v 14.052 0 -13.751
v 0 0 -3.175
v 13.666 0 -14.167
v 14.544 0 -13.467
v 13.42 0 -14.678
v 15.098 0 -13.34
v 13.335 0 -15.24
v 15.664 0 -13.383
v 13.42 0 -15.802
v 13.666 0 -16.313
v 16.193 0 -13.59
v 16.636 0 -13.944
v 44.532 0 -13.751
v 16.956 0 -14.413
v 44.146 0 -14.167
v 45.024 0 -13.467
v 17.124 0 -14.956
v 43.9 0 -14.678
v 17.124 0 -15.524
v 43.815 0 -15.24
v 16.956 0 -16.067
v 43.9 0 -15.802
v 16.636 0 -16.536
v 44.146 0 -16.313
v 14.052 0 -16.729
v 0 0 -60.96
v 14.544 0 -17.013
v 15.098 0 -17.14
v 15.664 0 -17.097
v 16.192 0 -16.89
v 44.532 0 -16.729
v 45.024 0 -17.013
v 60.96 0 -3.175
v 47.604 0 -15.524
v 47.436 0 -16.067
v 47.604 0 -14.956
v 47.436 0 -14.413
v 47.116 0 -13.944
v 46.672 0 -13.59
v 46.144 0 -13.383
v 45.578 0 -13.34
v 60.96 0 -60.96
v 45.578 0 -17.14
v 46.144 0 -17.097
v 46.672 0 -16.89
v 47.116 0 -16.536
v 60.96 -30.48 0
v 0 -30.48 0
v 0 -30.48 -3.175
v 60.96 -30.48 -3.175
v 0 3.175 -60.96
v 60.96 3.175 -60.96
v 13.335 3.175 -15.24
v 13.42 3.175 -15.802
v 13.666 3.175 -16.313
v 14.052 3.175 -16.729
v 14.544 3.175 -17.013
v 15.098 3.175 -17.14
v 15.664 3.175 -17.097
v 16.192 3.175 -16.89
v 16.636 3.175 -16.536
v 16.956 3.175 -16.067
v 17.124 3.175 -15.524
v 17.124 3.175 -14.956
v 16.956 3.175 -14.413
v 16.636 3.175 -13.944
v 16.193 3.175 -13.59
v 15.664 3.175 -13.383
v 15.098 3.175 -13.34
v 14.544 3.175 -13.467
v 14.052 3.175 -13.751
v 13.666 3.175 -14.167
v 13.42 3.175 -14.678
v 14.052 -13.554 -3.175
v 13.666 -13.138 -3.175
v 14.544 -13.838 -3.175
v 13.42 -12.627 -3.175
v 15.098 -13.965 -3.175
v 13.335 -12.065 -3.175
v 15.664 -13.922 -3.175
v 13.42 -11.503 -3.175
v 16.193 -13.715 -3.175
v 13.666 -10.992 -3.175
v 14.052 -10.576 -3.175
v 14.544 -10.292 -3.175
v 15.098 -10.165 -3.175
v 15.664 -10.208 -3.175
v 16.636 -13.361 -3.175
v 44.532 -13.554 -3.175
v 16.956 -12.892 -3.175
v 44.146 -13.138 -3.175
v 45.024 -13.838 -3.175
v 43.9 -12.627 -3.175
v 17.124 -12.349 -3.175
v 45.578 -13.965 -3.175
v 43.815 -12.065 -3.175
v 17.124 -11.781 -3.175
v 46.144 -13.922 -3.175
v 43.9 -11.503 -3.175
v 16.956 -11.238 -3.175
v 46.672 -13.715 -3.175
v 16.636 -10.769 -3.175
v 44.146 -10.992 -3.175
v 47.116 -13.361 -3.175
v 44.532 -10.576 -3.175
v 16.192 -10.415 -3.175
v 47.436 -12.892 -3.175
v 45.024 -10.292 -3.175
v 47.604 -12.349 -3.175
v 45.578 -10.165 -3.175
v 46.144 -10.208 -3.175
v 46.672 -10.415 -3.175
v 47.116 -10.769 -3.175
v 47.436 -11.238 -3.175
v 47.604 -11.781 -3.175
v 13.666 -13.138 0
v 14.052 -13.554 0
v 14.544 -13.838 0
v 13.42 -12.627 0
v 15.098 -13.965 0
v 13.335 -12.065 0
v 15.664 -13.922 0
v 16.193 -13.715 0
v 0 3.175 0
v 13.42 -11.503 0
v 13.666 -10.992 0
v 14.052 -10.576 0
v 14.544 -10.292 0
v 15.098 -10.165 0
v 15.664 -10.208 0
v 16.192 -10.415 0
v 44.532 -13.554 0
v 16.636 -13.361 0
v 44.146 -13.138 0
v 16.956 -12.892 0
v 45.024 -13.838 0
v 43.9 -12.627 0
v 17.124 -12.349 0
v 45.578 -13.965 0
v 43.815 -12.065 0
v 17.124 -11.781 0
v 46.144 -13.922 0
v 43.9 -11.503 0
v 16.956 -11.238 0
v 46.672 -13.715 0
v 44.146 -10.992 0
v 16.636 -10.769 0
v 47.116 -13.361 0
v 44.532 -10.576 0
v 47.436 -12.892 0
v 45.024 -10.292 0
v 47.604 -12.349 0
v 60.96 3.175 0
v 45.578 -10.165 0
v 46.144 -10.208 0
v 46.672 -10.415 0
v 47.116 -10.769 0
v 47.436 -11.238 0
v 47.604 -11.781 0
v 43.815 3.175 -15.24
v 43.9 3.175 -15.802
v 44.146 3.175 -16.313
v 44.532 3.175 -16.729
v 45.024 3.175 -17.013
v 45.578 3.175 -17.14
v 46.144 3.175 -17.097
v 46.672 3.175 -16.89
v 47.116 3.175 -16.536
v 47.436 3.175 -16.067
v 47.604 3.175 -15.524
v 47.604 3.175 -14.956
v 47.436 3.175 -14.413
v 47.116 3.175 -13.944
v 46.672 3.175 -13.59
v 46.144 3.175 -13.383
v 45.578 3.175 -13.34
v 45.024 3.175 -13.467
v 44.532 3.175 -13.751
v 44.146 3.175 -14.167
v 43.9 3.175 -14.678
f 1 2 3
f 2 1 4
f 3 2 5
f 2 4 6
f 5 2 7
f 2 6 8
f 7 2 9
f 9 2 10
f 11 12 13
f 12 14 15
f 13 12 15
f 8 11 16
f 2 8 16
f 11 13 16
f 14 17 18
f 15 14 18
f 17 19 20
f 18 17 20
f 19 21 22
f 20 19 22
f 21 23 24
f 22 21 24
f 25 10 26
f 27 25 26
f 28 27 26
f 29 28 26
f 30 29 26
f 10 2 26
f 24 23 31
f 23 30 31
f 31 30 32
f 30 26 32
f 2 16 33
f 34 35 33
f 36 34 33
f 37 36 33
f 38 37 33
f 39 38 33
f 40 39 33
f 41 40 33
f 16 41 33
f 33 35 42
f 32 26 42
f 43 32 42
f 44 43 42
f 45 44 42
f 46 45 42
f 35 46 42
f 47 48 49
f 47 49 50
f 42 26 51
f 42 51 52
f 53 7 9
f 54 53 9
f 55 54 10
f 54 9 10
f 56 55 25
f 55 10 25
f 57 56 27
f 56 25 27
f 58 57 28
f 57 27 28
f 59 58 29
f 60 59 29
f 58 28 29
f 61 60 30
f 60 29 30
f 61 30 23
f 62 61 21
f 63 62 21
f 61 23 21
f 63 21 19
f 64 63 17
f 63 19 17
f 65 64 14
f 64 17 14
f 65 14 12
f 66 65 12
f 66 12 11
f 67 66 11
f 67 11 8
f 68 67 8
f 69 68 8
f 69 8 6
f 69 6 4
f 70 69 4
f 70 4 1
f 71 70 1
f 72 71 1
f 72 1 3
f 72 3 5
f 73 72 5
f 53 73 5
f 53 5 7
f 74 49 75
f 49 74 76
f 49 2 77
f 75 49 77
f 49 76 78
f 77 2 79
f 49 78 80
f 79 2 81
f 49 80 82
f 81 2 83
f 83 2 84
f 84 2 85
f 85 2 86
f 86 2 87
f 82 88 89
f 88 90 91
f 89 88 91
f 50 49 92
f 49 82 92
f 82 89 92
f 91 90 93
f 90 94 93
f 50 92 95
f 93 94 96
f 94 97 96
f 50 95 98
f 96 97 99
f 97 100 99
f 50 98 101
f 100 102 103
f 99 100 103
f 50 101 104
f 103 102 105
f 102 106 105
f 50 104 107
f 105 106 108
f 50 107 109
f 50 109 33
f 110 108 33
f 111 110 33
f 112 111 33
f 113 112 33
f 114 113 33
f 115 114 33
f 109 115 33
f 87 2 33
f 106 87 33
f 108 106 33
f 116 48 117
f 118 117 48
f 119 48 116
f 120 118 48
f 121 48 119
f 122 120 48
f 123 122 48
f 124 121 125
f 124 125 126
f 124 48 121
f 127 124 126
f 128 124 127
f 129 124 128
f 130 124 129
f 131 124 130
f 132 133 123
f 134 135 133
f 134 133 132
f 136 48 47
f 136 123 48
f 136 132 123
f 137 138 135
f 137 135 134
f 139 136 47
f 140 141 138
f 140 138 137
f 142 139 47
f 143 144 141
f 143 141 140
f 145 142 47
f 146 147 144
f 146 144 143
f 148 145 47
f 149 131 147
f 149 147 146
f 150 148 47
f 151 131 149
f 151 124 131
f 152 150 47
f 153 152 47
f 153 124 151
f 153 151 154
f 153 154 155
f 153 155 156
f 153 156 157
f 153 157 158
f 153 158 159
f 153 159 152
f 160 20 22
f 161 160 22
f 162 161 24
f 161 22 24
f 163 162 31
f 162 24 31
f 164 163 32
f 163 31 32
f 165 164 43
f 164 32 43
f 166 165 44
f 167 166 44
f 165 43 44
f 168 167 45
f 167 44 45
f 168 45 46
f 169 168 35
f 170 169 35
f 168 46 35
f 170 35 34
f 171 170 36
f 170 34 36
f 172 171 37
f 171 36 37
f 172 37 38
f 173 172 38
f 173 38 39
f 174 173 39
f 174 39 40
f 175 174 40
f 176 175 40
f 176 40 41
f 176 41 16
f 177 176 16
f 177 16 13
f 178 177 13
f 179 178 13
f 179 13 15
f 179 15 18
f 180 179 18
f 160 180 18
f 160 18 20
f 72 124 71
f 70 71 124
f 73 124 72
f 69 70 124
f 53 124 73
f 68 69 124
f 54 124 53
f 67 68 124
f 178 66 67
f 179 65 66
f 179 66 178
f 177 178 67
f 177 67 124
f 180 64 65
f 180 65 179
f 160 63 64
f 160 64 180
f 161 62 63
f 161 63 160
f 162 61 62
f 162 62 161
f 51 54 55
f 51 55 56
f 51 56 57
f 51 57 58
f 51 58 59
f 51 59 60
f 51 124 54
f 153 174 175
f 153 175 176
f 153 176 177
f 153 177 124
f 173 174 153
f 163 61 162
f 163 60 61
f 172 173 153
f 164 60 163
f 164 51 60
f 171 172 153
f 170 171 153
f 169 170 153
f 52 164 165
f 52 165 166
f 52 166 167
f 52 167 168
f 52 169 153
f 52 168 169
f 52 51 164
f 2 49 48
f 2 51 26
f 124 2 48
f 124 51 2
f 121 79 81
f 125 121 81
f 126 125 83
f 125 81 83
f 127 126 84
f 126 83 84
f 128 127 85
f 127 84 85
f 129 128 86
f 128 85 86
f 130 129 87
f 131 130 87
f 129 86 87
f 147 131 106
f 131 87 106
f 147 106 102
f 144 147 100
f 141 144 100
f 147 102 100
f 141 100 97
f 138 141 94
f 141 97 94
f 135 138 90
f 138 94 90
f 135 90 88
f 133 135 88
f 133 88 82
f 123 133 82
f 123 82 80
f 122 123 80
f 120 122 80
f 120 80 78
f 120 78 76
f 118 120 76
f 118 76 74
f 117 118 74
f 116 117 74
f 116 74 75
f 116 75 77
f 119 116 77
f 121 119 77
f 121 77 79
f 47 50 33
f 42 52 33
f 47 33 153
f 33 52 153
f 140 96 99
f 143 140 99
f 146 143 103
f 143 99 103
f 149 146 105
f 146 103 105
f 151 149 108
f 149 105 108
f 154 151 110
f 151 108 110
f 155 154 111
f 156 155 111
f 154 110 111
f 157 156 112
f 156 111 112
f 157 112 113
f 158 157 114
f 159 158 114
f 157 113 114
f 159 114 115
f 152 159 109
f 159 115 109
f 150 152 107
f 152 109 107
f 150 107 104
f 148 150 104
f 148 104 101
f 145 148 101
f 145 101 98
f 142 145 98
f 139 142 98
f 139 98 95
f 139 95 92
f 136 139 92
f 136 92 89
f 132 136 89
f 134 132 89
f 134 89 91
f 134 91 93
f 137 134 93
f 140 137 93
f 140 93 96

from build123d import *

# Parameters (mm, degrees)
SKETCH3_W                 = 60.96
SKETCH3_H                 = 60.96
BOSS_EXTRUDE1_DEPTH       = 3.175
F_6_0_15_DIAMETER_HOLE1_D = 3.81
SKETCH6_W                 = 60.96
SKETCH6_H                 = 3.175
BOSS_EXTRUDE3_DEPTH       = 30.48
F_6_0_15_DIAMETER_HOLE2_D = 3.81


with BuildPart() as part:
    # Sketch3 → Boss-Extrude1 (new body)
    with BuildSketch(Plane(origin=(0, 0, 0), x_dir=(1, 0, 0), z_dir=(0, 1, 0))):
        with Locations((30.48, 30.48)):
            Rectangle(SKETCH3_W, SKETCH3_H)
    extrude(amount=BOSS_EXTRUDE1_DEPTH)

    # #6 (0.15) Diameter Hole1 (through all)
    with Locations(Plane(origin=(0, 3.175, 0), x_dir=(1, 0, 0), z_dir=(0, 1, 0))):
        with Locations((15.24, 15.24), (45.72, 15.24)):
            Hole(F_6_0_15_DIAMETER_HOLE1_D / 2)

    # Sketch6 → Boss-Extrude3 (add)
    with BuildSketch(Plane.XZ):
        with Locations((30.48, -1.5875)):
            Rectangle(SKETCH6_W, SKETCH6_H)
    extrude(amount=BOSS_EXTRUDE3_DEPTH)

    # #6 (0.15) Diameter Hole2 (through all)
    with Locations(Plane.XY):
        with Locations((15.24, -12.065), (45.72, -12.065)):
            Hole(F_6_0_15_DIAMETER_HOLE2_D / 2)


solid = part.part
